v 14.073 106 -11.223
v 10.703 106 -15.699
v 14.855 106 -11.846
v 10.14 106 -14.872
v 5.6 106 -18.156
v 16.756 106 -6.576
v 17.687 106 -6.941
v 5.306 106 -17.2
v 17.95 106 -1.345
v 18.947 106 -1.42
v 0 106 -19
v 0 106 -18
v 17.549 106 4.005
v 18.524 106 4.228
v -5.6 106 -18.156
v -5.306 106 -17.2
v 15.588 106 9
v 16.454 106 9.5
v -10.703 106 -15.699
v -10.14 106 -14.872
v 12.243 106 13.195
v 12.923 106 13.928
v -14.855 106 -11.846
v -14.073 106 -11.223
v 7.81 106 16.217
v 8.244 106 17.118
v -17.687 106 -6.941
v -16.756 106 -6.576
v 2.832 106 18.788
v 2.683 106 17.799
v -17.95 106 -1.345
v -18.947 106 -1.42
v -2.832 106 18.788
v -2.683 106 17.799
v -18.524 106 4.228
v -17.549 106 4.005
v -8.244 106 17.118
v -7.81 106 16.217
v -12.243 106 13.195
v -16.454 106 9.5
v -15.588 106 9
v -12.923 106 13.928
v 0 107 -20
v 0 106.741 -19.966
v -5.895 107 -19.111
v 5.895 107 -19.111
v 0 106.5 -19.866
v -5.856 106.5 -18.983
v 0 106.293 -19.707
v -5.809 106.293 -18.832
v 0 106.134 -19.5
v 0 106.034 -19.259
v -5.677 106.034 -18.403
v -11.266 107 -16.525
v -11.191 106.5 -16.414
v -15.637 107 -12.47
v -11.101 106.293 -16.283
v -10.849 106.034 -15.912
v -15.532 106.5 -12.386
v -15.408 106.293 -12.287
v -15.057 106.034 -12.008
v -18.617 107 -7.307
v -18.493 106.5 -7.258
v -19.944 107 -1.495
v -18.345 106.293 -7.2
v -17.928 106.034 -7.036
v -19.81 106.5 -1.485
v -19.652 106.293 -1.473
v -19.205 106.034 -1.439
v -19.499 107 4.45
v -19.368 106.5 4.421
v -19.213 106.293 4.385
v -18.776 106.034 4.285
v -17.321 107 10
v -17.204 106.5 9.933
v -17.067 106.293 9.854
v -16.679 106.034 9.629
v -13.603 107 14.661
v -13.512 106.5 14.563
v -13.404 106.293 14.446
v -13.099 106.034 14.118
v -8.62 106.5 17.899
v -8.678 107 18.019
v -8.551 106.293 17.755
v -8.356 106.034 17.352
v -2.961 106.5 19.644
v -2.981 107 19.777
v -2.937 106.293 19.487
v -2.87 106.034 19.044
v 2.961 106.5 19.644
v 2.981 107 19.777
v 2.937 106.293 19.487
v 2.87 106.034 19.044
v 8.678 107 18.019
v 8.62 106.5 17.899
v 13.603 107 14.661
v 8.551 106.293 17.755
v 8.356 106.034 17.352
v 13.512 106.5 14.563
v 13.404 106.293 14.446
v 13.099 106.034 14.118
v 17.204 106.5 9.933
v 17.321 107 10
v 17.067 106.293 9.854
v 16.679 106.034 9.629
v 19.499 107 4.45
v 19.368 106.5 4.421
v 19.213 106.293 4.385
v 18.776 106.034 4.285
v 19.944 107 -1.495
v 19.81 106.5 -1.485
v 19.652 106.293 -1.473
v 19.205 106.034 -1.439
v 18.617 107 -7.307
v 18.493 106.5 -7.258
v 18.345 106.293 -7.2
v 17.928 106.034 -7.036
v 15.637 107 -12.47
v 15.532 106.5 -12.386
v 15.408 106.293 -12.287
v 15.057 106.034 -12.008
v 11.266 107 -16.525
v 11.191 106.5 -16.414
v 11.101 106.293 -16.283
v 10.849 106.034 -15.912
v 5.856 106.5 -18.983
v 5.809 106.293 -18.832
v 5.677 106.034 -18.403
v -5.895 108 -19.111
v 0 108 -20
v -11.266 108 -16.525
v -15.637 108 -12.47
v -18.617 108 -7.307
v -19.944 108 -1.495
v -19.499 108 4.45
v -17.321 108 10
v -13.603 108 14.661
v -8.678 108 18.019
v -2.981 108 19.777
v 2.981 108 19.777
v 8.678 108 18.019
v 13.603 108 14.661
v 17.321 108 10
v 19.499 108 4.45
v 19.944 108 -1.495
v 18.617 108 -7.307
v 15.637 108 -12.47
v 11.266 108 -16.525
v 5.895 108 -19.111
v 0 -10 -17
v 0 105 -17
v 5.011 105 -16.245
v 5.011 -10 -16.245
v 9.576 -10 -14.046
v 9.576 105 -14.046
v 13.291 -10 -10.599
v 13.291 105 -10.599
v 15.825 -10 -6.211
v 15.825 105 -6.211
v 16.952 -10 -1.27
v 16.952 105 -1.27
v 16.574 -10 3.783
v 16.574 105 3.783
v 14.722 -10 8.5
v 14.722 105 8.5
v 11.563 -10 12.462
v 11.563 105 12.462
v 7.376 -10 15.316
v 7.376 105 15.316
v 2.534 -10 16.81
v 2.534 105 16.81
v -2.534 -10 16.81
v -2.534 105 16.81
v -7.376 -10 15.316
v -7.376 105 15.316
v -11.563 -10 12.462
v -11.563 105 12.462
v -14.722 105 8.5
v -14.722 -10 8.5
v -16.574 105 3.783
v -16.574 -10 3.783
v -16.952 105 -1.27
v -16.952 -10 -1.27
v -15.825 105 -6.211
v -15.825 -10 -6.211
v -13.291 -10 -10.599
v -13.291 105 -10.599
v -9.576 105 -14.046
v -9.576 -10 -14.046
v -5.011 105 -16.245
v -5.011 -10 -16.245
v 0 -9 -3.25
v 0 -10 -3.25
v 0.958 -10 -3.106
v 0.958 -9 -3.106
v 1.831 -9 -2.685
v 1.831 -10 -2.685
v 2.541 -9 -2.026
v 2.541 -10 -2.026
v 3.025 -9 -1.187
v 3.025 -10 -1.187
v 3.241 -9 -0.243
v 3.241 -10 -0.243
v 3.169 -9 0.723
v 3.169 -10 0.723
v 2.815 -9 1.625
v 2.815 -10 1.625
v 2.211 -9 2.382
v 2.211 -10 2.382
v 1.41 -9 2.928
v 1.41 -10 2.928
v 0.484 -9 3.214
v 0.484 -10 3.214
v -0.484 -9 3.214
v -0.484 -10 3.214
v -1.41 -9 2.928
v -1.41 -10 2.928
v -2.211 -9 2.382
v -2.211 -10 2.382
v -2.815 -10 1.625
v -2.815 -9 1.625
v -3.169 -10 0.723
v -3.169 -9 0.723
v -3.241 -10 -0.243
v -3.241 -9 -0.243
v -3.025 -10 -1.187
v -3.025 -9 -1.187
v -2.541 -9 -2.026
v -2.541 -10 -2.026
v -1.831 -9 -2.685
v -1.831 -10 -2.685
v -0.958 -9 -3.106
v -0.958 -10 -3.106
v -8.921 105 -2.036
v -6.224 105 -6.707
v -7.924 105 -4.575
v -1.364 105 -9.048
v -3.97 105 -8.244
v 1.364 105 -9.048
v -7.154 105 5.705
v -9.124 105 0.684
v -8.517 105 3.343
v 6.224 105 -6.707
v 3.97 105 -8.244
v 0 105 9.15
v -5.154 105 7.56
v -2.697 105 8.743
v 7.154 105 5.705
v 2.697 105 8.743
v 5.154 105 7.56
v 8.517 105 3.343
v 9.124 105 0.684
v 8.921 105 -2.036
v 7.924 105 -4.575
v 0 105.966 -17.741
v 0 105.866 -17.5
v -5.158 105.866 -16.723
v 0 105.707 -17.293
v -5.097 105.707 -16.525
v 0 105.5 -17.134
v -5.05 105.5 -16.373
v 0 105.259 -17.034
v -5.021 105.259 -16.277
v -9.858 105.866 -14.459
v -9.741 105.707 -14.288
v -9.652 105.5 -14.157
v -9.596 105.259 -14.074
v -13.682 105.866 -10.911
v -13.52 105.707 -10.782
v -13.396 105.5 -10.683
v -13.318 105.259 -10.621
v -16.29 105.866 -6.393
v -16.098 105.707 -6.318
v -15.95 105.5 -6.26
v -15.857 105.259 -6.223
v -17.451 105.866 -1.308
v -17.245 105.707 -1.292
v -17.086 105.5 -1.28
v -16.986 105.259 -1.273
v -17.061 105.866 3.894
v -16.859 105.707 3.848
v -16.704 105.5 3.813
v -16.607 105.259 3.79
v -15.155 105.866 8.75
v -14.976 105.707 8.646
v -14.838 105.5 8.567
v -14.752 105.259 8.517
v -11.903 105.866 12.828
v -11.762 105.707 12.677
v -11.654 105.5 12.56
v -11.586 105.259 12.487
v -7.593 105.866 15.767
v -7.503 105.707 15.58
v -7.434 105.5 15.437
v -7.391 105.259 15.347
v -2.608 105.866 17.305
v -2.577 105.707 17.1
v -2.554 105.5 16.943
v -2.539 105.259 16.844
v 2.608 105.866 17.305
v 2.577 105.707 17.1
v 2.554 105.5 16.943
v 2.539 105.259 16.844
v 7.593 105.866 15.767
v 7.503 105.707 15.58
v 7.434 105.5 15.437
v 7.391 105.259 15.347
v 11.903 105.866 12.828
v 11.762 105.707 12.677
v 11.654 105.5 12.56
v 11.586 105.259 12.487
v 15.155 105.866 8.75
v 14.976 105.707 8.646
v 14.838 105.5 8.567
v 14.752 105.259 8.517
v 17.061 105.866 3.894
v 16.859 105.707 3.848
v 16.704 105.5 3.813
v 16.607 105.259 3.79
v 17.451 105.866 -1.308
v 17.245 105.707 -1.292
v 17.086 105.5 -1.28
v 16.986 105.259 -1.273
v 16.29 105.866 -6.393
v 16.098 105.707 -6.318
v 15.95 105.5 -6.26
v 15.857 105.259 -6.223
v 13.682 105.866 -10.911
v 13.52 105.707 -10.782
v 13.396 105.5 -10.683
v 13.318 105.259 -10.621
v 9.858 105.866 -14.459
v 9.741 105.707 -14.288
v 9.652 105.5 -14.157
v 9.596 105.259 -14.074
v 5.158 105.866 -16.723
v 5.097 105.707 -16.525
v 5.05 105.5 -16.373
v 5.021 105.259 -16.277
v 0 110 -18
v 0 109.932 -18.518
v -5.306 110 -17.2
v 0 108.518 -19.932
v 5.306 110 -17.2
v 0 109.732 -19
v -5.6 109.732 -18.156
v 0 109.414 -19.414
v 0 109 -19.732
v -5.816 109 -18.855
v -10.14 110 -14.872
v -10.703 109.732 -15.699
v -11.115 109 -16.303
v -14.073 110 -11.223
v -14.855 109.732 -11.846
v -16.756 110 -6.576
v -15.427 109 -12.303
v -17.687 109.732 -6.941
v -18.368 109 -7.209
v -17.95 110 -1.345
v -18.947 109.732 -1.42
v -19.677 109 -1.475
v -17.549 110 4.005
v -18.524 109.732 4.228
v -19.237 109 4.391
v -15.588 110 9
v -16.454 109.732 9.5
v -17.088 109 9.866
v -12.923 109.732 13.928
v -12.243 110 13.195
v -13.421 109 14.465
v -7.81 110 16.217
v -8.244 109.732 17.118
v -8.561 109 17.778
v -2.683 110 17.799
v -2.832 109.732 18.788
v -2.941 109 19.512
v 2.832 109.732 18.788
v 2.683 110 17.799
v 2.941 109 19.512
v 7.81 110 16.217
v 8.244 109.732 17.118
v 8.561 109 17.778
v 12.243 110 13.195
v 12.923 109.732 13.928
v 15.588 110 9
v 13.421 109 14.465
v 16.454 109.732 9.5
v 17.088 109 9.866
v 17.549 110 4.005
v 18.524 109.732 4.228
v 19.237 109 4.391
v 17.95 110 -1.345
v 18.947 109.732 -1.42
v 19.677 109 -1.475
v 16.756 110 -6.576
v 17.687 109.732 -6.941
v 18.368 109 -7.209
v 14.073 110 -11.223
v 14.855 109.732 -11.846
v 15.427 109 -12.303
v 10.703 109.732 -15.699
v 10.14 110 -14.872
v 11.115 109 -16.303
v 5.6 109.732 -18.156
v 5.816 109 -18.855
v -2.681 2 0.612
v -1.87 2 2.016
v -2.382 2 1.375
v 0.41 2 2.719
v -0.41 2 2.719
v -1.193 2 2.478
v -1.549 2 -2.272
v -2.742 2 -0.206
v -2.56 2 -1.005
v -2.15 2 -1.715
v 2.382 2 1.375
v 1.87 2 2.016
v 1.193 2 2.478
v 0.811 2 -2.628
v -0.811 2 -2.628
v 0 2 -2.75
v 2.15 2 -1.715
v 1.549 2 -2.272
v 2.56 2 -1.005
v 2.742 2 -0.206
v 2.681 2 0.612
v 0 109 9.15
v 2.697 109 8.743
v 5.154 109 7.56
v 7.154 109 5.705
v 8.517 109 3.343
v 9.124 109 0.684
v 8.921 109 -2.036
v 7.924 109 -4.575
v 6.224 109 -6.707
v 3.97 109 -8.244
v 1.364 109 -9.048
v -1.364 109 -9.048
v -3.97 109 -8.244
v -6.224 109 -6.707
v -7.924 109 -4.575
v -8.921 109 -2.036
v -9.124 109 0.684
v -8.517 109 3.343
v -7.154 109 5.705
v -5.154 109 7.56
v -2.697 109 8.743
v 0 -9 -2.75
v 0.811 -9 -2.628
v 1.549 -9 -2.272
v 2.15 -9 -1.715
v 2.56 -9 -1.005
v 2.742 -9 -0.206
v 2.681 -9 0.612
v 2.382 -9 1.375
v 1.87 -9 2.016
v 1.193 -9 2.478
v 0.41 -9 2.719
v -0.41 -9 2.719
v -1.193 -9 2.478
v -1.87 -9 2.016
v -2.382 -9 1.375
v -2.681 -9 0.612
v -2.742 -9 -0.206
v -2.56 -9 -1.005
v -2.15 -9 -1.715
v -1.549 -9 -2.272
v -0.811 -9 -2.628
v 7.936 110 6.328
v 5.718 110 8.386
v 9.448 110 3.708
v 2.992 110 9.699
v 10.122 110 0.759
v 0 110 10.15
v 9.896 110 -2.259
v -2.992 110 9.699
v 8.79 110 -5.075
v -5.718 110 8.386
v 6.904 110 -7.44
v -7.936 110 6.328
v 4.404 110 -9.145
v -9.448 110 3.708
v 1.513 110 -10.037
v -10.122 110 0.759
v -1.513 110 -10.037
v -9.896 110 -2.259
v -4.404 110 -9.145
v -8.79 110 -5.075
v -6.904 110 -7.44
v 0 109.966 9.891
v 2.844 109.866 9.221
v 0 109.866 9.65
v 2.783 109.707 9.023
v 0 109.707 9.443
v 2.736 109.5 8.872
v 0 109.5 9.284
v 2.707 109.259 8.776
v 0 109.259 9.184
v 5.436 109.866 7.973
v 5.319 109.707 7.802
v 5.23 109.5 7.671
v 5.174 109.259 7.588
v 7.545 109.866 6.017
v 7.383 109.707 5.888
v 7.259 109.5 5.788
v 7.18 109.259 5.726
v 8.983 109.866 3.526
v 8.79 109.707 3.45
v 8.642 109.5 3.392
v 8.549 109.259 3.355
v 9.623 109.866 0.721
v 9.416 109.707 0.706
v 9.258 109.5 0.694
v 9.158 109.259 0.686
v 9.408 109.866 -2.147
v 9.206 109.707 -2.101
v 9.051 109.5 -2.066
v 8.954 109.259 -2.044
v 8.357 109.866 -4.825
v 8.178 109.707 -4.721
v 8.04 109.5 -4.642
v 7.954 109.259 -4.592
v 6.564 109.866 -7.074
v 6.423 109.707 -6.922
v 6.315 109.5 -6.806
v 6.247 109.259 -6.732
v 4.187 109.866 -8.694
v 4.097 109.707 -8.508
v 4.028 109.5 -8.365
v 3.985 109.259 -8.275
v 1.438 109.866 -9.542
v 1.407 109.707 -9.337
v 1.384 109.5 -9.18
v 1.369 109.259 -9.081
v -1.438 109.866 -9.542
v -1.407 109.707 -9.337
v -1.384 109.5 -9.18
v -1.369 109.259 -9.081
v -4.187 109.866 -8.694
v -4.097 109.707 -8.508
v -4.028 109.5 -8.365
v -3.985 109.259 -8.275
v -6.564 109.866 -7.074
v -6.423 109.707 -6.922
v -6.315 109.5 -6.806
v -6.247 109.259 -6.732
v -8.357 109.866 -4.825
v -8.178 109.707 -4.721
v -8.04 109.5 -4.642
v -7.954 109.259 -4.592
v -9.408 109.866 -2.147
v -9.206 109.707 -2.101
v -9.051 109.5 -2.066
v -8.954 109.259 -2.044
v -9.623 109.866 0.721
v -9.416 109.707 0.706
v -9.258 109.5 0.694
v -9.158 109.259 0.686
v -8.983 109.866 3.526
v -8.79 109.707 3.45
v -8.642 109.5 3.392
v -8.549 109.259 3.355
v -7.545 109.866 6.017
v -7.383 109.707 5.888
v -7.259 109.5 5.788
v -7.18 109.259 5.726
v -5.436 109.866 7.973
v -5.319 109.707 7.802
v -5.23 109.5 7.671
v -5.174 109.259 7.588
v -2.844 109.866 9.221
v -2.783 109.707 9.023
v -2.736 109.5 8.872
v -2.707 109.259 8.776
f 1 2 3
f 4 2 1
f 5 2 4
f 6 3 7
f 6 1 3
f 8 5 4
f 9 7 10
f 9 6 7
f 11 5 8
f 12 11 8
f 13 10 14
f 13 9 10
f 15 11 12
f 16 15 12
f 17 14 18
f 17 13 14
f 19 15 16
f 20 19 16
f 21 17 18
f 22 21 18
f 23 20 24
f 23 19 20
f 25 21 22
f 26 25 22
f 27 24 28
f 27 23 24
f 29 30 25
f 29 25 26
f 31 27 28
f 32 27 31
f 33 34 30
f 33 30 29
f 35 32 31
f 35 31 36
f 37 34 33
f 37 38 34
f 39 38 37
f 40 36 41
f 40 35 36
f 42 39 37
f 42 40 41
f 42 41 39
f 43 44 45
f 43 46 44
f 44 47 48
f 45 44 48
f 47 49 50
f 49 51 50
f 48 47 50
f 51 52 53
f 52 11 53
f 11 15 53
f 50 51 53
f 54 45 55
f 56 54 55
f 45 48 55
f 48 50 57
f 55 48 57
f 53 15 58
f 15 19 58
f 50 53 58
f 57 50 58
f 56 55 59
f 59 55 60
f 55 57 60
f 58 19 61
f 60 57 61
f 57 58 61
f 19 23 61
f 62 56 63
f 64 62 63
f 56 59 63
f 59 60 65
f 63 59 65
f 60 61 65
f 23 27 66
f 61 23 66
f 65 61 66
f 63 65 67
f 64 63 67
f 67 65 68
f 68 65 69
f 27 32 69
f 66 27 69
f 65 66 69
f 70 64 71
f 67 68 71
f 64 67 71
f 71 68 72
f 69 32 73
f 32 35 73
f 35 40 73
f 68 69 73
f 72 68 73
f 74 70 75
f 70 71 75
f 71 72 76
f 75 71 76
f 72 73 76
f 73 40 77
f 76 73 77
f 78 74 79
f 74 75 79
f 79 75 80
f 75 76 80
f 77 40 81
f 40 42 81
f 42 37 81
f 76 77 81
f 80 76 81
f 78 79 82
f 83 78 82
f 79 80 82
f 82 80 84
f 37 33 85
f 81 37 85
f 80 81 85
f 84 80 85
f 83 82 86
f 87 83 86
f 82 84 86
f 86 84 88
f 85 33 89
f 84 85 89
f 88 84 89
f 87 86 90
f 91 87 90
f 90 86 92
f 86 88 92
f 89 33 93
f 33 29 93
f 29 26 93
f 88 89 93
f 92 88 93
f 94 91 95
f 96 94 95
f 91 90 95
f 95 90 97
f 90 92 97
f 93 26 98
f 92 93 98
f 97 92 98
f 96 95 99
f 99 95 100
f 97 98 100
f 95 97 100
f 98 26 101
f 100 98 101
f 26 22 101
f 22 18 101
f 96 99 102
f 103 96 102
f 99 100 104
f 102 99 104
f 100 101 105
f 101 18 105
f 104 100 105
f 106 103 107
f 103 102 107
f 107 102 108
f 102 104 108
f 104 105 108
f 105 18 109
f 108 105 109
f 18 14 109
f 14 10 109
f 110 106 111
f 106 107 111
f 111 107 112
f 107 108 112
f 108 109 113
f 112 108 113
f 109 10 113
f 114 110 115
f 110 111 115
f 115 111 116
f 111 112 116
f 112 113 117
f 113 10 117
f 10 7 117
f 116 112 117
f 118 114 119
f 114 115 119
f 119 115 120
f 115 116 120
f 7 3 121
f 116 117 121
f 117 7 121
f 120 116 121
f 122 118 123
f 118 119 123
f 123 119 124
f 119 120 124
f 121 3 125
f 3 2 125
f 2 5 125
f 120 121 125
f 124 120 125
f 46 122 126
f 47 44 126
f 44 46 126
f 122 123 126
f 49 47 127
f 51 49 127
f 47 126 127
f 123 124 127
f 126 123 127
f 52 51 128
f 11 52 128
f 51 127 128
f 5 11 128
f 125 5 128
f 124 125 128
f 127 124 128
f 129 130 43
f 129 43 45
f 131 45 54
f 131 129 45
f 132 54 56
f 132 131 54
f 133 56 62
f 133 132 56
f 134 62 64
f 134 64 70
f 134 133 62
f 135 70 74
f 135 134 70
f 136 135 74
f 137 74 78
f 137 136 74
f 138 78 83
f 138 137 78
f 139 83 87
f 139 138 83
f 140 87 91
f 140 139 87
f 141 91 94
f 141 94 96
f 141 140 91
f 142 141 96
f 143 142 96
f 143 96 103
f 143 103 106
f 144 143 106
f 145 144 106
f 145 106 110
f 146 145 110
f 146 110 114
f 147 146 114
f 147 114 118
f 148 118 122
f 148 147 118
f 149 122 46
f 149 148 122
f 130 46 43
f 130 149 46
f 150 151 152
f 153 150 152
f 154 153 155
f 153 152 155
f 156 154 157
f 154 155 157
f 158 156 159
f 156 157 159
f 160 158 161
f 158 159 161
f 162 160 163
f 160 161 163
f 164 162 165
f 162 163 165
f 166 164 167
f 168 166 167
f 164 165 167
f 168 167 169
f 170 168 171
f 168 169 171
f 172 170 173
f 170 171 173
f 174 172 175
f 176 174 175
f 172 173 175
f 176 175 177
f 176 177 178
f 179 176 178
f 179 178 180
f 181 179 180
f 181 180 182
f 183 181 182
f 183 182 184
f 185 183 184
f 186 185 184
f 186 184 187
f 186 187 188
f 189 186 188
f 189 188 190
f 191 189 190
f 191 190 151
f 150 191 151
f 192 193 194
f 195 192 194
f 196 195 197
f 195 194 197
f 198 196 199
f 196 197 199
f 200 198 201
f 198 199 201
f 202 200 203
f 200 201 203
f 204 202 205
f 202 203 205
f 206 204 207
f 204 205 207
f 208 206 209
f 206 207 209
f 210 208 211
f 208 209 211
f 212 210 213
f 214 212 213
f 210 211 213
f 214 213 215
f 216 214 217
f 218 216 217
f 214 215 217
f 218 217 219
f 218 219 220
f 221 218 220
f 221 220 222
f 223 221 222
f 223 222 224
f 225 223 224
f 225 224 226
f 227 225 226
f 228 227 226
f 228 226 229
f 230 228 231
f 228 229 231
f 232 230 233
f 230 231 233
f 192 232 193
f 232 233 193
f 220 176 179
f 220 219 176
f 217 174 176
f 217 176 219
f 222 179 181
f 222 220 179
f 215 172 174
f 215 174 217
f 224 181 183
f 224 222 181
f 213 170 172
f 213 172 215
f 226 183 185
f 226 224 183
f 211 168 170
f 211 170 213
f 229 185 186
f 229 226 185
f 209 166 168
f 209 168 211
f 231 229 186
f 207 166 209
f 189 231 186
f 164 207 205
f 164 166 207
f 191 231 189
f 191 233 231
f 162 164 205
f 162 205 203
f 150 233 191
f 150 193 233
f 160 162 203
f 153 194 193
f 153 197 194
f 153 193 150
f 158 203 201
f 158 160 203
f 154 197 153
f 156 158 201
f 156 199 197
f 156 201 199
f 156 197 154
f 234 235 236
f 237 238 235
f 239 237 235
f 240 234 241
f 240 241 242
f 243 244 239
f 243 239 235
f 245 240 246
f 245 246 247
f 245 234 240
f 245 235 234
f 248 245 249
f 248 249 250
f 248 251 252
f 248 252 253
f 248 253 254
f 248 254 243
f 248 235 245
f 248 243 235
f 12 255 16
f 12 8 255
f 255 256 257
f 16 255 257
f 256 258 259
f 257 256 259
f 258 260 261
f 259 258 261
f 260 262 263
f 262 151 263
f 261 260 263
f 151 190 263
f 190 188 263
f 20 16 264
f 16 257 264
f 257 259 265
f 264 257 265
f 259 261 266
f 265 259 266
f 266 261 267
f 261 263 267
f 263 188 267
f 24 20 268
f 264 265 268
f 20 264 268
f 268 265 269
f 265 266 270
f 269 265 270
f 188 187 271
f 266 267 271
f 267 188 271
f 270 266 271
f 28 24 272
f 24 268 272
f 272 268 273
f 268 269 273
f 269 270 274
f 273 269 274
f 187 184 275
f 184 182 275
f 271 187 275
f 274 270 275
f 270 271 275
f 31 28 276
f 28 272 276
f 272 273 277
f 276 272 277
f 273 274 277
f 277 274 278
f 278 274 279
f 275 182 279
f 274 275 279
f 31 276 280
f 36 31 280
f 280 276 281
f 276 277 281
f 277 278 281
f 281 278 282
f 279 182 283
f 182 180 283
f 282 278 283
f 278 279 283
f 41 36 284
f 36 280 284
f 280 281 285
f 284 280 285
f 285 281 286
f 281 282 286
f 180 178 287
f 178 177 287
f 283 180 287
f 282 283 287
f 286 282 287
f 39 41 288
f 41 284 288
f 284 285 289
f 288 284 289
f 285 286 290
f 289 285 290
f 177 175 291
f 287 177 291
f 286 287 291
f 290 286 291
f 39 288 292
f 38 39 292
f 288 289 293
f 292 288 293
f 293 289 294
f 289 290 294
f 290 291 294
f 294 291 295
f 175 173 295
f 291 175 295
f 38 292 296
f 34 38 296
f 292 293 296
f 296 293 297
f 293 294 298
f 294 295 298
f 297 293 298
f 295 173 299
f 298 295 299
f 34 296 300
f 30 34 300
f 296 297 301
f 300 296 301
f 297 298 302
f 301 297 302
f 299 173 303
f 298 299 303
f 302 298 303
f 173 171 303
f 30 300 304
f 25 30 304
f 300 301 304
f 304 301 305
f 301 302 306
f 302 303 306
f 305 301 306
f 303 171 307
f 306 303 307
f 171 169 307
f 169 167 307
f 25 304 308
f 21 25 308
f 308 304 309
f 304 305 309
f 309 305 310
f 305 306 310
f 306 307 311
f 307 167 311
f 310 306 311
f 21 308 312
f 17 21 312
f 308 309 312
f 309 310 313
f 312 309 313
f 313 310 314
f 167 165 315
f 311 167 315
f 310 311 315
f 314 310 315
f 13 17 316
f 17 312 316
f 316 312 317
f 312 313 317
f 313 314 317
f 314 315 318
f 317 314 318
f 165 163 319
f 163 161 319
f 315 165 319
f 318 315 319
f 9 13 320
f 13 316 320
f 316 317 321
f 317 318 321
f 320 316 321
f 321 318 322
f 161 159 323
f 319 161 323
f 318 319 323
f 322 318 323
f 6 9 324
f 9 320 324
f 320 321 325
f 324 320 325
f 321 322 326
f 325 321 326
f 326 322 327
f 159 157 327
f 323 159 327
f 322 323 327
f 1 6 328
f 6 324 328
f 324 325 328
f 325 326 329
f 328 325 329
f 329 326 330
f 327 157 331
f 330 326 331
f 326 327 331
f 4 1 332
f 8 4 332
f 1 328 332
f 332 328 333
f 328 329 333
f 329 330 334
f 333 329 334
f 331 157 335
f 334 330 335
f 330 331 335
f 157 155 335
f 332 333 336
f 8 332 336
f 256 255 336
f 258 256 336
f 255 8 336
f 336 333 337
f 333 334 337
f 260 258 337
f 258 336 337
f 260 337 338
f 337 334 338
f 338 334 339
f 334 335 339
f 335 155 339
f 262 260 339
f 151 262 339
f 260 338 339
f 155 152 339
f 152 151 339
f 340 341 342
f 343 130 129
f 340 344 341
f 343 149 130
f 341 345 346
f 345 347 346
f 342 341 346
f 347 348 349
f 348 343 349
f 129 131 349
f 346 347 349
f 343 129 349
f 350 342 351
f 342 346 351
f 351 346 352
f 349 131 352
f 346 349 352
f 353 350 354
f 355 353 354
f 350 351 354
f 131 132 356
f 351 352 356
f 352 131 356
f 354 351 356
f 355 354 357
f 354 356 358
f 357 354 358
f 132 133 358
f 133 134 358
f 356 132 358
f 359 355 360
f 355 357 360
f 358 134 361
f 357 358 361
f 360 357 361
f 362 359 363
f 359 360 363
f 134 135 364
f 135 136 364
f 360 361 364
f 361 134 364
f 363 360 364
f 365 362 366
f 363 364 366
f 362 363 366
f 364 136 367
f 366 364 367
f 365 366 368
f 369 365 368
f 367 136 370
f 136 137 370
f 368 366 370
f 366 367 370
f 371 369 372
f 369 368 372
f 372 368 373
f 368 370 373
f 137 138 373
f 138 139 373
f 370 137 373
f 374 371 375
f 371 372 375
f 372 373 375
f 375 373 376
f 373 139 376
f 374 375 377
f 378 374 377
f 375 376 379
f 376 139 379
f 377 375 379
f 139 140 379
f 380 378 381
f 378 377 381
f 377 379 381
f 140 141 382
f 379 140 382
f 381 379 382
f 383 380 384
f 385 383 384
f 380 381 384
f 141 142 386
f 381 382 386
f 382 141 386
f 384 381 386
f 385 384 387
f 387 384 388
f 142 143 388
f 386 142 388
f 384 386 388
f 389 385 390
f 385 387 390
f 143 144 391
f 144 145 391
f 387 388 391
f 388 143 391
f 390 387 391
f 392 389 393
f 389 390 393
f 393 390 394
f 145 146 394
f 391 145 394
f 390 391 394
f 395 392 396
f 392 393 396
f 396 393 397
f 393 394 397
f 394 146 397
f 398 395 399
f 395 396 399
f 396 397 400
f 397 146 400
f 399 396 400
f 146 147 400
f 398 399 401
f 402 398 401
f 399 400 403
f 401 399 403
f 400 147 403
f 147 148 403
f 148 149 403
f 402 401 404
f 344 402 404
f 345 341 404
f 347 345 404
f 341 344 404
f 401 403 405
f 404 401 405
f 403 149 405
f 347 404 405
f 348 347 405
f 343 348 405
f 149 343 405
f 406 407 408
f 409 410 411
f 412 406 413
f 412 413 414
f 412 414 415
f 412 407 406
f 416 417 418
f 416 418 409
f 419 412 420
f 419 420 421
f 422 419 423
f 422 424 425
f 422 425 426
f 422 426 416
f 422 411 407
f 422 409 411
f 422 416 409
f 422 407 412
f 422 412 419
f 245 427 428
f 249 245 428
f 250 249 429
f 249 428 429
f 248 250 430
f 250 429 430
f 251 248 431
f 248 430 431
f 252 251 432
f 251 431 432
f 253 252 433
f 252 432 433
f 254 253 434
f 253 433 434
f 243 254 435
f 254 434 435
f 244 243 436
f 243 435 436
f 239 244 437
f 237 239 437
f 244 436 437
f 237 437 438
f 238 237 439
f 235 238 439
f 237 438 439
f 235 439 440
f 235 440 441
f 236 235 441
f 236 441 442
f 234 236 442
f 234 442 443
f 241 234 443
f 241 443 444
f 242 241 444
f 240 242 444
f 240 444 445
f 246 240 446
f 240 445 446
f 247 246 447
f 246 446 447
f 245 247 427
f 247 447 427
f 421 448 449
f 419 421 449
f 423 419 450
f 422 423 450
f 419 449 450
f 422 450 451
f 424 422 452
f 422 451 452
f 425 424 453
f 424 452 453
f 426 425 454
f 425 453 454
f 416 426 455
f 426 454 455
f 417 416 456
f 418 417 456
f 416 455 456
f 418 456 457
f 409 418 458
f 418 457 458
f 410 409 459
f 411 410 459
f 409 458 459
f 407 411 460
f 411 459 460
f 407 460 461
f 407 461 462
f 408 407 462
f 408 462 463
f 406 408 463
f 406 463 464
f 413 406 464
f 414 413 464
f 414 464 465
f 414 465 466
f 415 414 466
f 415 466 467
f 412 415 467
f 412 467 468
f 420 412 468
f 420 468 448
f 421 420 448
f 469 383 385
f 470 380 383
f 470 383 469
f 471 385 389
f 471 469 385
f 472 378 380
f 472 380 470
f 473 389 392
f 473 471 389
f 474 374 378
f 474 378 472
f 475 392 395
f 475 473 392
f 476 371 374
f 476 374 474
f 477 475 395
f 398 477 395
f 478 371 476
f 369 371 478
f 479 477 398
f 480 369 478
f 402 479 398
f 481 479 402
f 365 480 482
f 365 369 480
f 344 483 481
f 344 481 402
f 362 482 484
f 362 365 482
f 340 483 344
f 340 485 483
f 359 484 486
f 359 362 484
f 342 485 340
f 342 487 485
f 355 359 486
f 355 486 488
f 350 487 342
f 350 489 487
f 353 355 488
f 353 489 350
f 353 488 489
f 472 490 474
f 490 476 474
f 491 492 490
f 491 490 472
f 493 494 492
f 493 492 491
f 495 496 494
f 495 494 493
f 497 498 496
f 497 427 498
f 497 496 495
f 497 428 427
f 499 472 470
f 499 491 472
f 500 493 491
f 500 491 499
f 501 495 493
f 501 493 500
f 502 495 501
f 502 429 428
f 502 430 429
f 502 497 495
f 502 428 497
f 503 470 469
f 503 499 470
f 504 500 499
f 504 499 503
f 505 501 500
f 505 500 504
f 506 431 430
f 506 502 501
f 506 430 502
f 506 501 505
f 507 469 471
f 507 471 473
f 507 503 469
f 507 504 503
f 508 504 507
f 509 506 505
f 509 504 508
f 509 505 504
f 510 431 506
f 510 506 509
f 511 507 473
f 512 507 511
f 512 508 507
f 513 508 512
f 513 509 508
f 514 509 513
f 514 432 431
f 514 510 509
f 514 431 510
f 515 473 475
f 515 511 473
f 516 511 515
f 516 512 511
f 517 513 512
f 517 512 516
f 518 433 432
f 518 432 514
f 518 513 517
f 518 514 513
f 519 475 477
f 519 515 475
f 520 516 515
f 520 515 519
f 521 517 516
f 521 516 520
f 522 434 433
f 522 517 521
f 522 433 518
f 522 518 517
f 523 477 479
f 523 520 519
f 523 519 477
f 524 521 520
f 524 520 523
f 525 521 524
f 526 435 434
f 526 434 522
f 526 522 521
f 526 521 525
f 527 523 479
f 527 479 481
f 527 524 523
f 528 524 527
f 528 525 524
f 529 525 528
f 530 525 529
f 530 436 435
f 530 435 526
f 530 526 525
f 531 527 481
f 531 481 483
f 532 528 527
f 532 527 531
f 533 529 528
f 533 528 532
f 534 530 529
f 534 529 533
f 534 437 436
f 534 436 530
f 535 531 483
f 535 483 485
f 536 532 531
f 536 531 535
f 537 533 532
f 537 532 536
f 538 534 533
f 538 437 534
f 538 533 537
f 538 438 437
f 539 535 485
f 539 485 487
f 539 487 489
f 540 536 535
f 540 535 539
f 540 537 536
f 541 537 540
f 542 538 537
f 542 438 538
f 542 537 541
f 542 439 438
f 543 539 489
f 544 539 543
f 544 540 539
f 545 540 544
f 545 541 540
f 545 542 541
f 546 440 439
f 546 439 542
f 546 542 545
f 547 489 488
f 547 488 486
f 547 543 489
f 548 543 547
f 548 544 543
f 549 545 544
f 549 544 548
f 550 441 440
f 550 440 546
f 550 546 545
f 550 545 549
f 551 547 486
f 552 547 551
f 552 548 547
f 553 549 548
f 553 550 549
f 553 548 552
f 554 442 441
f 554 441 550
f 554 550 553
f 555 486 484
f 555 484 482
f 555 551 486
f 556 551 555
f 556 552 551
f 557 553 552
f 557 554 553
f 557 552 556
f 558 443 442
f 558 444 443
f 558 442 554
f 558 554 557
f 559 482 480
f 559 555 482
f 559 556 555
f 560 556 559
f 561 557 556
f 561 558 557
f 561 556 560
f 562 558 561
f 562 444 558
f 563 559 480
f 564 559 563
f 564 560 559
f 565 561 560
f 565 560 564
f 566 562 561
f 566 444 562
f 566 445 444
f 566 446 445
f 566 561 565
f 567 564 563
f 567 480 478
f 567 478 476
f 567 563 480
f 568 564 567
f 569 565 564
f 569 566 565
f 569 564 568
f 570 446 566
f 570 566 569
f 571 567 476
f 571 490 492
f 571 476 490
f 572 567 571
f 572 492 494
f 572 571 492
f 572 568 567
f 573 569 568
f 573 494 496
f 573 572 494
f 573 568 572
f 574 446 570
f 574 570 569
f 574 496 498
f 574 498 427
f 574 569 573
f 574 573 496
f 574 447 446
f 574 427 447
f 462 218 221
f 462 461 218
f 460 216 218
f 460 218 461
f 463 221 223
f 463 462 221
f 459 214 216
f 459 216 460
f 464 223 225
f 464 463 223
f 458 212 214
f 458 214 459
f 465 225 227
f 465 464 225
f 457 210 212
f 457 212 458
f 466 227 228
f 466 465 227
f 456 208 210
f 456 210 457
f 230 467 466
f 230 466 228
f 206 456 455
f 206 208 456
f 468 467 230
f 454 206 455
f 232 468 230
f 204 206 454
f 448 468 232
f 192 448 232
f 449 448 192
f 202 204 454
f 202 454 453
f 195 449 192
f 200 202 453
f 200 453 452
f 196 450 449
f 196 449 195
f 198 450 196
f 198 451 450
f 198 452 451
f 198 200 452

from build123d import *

# Parameters (mm, degrees)
SKETCH2_R          = 17
EXTRUSION4_DEPTH   = 10
SKETCH3_R          = 9.15
EXTRUSION5_DEPTH   = 5
FILLET2_R          = 1
FILLET3_R          = 2
FILLET4_R          = 1
FILLET5_R          = 1
SKETCH4_R          = 2.75
CUT_EXTRUDE3_DEPTH = 12
SKETCH5_R          = 3.25
CUT_EXTRUDE4_DEPTH = 1


with BuildPart() as part:
    # Sketch1 → Revolution1 (revolve)
    with BuildSketch(Plane.XY, mode=Mode.PRIVATE) as revolution1_sk:
        Polygon((17, 0), (17, 106), (20, 106), (20, 110), (0, 110), (0, 0), align=None)
    revolve(revolution1_sk.sketch.rotate(Axis((0, 0, 0), (0, 1, 0)), 90), axis=Axis((0, 0, 0), (0, 1, 0)))

    # Sketch2 → Extrusion4 (add)
    with BuildSketch(Plane.XZ):
        with Locations(Location((0, 0, 0), (0, 0, 270))):
            Circle(SKETCH2_R)
    extrude(amount=EXTRUSION4_DEPTH)

    # Sketch3 → Extrusion5 (cut)
    with BuildSketch(Plane(origin=(0, 110, 0), x_dir=(-1, 0, 0), z_dir=(0, 1, 0))):
        with Locations(Location((0, 0, 0), (0, 0, 90))):
            Circle(SKETCH3_R)
    extrude(amount=-EXTRUSION5_DEPTH, mode=Mode.SUBTRACT)

    # Fillet2
    fillet2_edges = [part.edges().sort_by_distance(p)[0] for p in [
        (0, 110, -9.15),
    ]]
    fillet(fillet2_edges, radius=FILLET2_R)

    # Fillet3
    fillet3_edges = [part.edges().sort_by_distance(p)[0] for p in [
        (0, 110, 20),
    ]]
    fillet(fillet3_edges, radius=FILLET3_R)

    # Fillet4
    fillet4_edges = [part.edges().sort_by_distance(p)[0] for p in [
        (0, 106, 20),
    ]]
    fillet(fillet4_edges, radius=FILLET4_R)

    # Fillet5
    fillet5_edges = [part.edges().sort_by_distance(p)[0] for p in [
        (0, 106, 17),
    ]]
    fillet(fillet5_edges, radius=FILLET5_R)

    # Sketch4 → Cut-Extrude3 (cut)
    with BuildSketch(Plane.XZ.offset(10)):
        with Locations(Location((0, 0, 0), (0, 0, 270))):
            Circle(SKETCH4_R)
    extrude(amount=-CUT_EXTRUDE3_DEPTH, mode=Mode.SUBTRACT)

    # Sketch5 → Cut-Extrude4 (cut)
    with BuildSketch(Plane.XZ.offset(10)):
        with Locations(Location((0, 0, 0), (0, 0, 270))):
            Circle(SKETCH5_R)
    extrude(amount=-CUT_EXTRUDE4_DEPTH, mode=Mode.SUBTRACT)


solid = part.part
